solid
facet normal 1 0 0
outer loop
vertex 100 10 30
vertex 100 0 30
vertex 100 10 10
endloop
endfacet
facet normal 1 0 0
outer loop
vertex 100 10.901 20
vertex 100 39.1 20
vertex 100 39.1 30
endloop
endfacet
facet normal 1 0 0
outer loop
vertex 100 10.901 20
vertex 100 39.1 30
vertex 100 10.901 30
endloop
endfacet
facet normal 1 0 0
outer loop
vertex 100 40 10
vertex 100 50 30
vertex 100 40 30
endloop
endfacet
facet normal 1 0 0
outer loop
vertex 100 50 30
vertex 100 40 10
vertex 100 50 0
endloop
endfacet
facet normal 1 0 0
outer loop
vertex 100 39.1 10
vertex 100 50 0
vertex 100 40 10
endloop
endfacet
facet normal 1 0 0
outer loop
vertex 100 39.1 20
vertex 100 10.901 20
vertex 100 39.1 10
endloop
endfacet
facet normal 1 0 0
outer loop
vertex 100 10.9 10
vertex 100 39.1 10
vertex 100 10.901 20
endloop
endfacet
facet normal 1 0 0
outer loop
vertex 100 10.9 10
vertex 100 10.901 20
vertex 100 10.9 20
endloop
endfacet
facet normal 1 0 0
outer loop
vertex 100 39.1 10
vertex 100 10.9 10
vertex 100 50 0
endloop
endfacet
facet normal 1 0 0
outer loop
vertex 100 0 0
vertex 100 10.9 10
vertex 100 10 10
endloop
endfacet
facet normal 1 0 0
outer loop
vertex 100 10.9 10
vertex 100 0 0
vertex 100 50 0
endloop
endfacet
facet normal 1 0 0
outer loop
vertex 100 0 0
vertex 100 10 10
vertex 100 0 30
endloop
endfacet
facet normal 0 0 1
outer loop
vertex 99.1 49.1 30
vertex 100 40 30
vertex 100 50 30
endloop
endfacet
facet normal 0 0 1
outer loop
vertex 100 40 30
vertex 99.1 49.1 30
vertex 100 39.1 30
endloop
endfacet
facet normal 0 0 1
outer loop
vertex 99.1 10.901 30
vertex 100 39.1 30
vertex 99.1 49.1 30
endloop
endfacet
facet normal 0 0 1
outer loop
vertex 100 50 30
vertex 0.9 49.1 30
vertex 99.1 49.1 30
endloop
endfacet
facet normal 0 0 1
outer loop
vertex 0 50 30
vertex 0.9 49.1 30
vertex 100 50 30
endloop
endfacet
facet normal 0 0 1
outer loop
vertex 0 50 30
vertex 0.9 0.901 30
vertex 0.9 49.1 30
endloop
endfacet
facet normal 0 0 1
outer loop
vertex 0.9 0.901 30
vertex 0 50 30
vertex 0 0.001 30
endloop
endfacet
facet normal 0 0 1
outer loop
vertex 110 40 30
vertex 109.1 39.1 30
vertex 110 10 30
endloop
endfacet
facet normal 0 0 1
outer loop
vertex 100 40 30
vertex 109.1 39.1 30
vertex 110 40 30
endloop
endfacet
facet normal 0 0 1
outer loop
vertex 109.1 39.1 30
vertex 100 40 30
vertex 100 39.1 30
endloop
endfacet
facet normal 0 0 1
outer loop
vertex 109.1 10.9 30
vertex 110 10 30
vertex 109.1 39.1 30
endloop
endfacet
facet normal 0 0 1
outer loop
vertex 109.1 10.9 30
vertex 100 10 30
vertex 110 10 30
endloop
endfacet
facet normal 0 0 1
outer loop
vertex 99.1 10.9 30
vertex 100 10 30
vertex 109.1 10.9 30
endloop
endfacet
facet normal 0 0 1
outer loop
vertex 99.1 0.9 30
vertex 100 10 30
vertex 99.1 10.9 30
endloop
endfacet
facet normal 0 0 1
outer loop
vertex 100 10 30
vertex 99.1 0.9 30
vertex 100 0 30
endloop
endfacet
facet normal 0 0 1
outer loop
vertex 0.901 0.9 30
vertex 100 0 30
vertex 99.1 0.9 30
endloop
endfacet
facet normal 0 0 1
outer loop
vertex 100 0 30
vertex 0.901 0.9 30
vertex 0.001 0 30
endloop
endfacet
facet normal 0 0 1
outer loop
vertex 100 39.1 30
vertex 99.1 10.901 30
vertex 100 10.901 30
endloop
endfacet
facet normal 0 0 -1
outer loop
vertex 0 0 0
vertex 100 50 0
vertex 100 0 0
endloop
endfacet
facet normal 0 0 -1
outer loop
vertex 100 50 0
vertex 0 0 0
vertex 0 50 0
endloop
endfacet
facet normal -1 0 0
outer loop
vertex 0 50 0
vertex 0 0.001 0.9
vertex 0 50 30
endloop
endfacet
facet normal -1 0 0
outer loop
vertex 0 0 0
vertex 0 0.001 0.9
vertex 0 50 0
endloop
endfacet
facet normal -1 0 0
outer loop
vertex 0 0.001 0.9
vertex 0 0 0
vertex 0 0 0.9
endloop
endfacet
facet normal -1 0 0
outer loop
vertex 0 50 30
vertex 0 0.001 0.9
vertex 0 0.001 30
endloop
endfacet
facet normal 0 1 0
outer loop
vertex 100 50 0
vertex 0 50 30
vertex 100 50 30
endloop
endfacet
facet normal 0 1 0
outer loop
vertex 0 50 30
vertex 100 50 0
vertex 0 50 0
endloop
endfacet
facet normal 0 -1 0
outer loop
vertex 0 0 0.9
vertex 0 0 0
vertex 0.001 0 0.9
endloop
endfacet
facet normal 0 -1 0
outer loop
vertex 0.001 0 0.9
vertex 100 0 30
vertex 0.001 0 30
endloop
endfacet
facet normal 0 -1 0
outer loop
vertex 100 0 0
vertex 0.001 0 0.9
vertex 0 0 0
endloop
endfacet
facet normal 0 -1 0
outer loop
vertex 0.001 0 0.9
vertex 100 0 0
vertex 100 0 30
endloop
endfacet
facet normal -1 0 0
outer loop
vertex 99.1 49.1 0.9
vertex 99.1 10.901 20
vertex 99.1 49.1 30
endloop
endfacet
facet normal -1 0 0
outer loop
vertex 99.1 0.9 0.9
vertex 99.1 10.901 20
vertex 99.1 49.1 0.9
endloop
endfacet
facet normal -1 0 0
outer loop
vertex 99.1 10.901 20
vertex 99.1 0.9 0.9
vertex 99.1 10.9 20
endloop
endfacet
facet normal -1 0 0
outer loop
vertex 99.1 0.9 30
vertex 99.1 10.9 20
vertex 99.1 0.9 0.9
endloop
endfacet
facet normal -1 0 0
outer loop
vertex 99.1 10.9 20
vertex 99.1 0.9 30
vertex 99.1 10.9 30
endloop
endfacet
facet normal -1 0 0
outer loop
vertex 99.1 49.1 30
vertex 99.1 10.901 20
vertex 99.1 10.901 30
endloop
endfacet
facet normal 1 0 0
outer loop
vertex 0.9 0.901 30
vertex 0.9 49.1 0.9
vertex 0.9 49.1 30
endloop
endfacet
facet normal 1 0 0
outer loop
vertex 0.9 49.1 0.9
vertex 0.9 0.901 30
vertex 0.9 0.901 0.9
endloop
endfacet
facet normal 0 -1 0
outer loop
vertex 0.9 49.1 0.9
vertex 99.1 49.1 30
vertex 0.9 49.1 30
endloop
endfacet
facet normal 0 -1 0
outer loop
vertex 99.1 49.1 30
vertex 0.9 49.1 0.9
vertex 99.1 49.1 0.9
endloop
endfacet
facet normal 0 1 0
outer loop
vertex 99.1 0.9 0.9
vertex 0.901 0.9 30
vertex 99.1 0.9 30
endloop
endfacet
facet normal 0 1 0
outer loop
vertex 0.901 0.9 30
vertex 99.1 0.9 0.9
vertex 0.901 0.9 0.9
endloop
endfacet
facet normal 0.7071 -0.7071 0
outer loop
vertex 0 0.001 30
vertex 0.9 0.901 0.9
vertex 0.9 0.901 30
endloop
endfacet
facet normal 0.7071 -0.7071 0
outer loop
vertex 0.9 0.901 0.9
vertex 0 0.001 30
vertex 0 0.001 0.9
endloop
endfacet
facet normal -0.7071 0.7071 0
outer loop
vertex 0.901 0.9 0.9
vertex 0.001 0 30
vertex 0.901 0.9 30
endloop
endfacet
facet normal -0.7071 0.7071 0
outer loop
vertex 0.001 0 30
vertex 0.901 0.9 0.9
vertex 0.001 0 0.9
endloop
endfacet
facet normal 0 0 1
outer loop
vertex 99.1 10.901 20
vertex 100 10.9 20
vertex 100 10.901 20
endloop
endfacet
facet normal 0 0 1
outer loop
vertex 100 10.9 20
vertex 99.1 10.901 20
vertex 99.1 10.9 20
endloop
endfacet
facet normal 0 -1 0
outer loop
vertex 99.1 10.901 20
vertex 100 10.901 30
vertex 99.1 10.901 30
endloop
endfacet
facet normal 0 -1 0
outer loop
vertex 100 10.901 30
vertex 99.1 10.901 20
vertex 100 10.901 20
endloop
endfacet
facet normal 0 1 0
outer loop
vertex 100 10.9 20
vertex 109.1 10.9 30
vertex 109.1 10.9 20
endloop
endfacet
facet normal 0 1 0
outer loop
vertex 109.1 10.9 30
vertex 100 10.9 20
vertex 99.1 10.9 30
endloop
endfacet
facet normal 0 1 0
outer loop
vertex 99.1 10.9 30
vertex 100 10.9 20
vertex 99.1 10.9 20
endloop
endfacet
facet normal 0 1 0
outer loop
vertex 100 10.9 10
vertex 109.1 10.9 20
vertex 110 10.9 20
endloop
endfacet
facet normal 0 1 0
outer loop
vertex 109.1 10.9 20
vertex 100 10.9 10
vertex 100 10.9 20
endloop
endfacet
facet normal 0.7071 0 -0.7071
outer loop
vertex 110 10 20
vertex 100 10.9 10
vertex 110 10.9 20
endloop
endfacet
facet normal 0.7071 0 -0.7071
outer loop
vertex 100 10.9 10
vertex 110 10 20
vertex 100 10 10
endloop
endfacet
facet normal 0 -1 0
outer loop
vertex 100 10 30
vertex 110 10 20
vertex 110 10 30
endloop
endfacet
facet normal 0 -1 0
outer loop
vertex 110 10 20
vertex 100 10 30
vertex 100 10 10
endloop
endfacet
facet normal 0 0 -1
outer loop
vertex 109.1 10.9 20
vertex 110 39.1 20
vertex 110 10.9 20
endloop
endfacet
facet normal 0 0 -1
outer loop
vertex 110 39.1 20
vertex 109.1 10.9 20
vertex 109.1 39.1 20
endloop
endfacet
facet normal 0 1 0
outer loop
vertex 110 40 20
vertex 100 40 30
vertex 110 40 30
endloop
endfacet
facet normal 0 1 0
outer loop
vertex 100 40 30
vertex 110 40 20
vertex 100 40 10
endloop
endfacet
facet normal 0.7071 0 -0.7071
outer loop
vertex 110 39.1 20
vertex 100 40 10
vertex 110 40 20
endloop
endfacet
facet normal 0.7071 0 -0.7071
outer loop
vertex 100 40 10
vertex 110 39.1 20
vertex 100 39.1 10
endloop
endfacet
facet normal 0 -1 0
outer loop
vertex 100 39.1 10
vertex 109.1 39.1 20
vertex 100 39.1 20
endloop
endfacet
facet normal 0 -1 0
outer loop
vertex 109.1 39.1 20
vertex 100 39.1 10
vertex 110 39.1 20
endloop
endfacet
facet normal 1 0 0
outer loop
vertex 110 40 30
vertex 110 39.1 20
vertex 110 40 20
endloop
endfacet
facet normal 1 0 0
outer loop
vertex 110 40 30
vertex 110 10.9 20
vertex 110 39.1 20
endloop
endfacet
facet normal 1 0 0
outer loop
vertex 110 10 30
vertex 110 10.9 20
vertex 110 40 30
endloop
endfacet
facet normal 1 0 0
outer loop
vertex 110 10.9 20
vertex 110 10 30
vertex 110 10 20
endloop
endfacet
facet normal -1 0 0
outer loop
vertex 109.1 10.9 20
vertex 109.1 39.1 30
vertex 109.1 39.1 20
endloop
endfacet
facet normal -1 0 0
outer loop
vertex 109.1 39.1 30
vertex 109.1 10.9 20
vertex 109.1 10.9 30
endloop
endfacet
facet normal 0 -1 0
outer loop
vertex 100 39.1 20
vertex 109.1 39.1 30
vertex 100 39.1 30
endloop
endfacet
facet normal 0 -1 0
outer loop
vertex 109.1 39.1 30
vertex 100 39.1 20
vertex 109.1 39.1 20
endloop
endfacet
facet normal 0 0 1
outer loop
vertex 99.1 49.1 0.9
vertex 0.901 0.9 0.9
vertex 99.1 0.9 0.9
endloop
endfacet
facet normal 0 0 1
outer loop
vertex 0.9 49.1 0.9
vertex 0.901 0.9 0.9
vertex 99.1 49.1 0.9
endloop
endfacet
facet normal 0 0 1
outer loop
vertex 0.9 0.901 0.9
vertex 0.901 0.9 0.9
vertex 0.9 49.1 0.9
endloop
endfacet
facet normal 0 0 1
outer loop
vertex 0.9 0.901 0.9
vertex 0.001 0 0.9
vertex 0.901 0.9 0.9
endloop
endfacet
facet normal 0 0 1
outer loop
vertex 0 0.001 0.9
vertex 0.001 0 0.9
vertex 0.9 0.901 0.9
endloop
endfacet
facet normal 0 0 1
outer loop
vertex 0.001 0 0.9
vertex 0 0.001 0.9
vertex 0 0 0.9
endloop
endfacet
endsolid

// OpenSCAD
size=[100,50,30];
holder=[10,30,10,10];
thread=0.45;

not=0.001;

vaseFloor([size.x,size.y,2*thread]);
cubeHolderVase2(size,holder,thread);

/// 2 wall cube without bottom or ceiling
module cubeVase2(size=[10,10,10],thread=0.45,gap=0.001){
	difference(){
		cube(size);
		t([2*thread,2*thread,-size.z]) cube([size.x-4*thread,size.y-4*thread,3*size.z]);
		
		///1st layer
		rt(45,v=[0,-gap/2,0]) cube([2*thread*sqrt(2)+gap,gap,size.x]);
	}
}

/// 2 wall cube without bottom or ceiling
module cubeHolderVase2(size=[10,10,10],holder=[5,10,3,2],thread=0.45,gap=0.001){
	
	difference(){
		cubeVase2(size,thread,gap);
		t([size.x-2*thread,shift+2*thread,holder.x+holder[3]]) cube([2*thread,gap,holder.z]);
	}

	shift=(size.y-holder.y)/2;

	//support holder
	for(y=[shift,size.y-shift-2*thread]){
		t([size.x,y,holder[3]]) rt([90,0,0],[0,0,0],[0,0,-2*thread]) linear_extrude(2*thread) polygon([[0,0],[0,holder.x],[holder.x,holder.x]]);
	}
	
	//holder
	t([0,0,holder[3]]) difference(){
		t([size.x,shift,holder.x]) cube([holder.x,holder.y,holder.z]);
		t([size.x,shift+2*thread,holder.x-not]) cube([holder.x-2*thread,holder.y-4*thread,holder.z+2*not]);
	}
}

module vaseFloor(size=[10,10,2]){
	cube(size);
}

module t(v=[0,0,0]){translate(v) children();}
module r(a=[0,0,0],rp=[0,0,0]){translate(rp) rotate(a) translate(-rp) children();}
module tr(v=[0,0,0],a=[0,0,0],rp=[0,0,0]){t(v) r(a,rp) children();}
module rt(a=[0,0,0],rp=[0,0,0],v=[0,0,0]){r(a,rp) t(v) children();}
module u(){union() children();}
